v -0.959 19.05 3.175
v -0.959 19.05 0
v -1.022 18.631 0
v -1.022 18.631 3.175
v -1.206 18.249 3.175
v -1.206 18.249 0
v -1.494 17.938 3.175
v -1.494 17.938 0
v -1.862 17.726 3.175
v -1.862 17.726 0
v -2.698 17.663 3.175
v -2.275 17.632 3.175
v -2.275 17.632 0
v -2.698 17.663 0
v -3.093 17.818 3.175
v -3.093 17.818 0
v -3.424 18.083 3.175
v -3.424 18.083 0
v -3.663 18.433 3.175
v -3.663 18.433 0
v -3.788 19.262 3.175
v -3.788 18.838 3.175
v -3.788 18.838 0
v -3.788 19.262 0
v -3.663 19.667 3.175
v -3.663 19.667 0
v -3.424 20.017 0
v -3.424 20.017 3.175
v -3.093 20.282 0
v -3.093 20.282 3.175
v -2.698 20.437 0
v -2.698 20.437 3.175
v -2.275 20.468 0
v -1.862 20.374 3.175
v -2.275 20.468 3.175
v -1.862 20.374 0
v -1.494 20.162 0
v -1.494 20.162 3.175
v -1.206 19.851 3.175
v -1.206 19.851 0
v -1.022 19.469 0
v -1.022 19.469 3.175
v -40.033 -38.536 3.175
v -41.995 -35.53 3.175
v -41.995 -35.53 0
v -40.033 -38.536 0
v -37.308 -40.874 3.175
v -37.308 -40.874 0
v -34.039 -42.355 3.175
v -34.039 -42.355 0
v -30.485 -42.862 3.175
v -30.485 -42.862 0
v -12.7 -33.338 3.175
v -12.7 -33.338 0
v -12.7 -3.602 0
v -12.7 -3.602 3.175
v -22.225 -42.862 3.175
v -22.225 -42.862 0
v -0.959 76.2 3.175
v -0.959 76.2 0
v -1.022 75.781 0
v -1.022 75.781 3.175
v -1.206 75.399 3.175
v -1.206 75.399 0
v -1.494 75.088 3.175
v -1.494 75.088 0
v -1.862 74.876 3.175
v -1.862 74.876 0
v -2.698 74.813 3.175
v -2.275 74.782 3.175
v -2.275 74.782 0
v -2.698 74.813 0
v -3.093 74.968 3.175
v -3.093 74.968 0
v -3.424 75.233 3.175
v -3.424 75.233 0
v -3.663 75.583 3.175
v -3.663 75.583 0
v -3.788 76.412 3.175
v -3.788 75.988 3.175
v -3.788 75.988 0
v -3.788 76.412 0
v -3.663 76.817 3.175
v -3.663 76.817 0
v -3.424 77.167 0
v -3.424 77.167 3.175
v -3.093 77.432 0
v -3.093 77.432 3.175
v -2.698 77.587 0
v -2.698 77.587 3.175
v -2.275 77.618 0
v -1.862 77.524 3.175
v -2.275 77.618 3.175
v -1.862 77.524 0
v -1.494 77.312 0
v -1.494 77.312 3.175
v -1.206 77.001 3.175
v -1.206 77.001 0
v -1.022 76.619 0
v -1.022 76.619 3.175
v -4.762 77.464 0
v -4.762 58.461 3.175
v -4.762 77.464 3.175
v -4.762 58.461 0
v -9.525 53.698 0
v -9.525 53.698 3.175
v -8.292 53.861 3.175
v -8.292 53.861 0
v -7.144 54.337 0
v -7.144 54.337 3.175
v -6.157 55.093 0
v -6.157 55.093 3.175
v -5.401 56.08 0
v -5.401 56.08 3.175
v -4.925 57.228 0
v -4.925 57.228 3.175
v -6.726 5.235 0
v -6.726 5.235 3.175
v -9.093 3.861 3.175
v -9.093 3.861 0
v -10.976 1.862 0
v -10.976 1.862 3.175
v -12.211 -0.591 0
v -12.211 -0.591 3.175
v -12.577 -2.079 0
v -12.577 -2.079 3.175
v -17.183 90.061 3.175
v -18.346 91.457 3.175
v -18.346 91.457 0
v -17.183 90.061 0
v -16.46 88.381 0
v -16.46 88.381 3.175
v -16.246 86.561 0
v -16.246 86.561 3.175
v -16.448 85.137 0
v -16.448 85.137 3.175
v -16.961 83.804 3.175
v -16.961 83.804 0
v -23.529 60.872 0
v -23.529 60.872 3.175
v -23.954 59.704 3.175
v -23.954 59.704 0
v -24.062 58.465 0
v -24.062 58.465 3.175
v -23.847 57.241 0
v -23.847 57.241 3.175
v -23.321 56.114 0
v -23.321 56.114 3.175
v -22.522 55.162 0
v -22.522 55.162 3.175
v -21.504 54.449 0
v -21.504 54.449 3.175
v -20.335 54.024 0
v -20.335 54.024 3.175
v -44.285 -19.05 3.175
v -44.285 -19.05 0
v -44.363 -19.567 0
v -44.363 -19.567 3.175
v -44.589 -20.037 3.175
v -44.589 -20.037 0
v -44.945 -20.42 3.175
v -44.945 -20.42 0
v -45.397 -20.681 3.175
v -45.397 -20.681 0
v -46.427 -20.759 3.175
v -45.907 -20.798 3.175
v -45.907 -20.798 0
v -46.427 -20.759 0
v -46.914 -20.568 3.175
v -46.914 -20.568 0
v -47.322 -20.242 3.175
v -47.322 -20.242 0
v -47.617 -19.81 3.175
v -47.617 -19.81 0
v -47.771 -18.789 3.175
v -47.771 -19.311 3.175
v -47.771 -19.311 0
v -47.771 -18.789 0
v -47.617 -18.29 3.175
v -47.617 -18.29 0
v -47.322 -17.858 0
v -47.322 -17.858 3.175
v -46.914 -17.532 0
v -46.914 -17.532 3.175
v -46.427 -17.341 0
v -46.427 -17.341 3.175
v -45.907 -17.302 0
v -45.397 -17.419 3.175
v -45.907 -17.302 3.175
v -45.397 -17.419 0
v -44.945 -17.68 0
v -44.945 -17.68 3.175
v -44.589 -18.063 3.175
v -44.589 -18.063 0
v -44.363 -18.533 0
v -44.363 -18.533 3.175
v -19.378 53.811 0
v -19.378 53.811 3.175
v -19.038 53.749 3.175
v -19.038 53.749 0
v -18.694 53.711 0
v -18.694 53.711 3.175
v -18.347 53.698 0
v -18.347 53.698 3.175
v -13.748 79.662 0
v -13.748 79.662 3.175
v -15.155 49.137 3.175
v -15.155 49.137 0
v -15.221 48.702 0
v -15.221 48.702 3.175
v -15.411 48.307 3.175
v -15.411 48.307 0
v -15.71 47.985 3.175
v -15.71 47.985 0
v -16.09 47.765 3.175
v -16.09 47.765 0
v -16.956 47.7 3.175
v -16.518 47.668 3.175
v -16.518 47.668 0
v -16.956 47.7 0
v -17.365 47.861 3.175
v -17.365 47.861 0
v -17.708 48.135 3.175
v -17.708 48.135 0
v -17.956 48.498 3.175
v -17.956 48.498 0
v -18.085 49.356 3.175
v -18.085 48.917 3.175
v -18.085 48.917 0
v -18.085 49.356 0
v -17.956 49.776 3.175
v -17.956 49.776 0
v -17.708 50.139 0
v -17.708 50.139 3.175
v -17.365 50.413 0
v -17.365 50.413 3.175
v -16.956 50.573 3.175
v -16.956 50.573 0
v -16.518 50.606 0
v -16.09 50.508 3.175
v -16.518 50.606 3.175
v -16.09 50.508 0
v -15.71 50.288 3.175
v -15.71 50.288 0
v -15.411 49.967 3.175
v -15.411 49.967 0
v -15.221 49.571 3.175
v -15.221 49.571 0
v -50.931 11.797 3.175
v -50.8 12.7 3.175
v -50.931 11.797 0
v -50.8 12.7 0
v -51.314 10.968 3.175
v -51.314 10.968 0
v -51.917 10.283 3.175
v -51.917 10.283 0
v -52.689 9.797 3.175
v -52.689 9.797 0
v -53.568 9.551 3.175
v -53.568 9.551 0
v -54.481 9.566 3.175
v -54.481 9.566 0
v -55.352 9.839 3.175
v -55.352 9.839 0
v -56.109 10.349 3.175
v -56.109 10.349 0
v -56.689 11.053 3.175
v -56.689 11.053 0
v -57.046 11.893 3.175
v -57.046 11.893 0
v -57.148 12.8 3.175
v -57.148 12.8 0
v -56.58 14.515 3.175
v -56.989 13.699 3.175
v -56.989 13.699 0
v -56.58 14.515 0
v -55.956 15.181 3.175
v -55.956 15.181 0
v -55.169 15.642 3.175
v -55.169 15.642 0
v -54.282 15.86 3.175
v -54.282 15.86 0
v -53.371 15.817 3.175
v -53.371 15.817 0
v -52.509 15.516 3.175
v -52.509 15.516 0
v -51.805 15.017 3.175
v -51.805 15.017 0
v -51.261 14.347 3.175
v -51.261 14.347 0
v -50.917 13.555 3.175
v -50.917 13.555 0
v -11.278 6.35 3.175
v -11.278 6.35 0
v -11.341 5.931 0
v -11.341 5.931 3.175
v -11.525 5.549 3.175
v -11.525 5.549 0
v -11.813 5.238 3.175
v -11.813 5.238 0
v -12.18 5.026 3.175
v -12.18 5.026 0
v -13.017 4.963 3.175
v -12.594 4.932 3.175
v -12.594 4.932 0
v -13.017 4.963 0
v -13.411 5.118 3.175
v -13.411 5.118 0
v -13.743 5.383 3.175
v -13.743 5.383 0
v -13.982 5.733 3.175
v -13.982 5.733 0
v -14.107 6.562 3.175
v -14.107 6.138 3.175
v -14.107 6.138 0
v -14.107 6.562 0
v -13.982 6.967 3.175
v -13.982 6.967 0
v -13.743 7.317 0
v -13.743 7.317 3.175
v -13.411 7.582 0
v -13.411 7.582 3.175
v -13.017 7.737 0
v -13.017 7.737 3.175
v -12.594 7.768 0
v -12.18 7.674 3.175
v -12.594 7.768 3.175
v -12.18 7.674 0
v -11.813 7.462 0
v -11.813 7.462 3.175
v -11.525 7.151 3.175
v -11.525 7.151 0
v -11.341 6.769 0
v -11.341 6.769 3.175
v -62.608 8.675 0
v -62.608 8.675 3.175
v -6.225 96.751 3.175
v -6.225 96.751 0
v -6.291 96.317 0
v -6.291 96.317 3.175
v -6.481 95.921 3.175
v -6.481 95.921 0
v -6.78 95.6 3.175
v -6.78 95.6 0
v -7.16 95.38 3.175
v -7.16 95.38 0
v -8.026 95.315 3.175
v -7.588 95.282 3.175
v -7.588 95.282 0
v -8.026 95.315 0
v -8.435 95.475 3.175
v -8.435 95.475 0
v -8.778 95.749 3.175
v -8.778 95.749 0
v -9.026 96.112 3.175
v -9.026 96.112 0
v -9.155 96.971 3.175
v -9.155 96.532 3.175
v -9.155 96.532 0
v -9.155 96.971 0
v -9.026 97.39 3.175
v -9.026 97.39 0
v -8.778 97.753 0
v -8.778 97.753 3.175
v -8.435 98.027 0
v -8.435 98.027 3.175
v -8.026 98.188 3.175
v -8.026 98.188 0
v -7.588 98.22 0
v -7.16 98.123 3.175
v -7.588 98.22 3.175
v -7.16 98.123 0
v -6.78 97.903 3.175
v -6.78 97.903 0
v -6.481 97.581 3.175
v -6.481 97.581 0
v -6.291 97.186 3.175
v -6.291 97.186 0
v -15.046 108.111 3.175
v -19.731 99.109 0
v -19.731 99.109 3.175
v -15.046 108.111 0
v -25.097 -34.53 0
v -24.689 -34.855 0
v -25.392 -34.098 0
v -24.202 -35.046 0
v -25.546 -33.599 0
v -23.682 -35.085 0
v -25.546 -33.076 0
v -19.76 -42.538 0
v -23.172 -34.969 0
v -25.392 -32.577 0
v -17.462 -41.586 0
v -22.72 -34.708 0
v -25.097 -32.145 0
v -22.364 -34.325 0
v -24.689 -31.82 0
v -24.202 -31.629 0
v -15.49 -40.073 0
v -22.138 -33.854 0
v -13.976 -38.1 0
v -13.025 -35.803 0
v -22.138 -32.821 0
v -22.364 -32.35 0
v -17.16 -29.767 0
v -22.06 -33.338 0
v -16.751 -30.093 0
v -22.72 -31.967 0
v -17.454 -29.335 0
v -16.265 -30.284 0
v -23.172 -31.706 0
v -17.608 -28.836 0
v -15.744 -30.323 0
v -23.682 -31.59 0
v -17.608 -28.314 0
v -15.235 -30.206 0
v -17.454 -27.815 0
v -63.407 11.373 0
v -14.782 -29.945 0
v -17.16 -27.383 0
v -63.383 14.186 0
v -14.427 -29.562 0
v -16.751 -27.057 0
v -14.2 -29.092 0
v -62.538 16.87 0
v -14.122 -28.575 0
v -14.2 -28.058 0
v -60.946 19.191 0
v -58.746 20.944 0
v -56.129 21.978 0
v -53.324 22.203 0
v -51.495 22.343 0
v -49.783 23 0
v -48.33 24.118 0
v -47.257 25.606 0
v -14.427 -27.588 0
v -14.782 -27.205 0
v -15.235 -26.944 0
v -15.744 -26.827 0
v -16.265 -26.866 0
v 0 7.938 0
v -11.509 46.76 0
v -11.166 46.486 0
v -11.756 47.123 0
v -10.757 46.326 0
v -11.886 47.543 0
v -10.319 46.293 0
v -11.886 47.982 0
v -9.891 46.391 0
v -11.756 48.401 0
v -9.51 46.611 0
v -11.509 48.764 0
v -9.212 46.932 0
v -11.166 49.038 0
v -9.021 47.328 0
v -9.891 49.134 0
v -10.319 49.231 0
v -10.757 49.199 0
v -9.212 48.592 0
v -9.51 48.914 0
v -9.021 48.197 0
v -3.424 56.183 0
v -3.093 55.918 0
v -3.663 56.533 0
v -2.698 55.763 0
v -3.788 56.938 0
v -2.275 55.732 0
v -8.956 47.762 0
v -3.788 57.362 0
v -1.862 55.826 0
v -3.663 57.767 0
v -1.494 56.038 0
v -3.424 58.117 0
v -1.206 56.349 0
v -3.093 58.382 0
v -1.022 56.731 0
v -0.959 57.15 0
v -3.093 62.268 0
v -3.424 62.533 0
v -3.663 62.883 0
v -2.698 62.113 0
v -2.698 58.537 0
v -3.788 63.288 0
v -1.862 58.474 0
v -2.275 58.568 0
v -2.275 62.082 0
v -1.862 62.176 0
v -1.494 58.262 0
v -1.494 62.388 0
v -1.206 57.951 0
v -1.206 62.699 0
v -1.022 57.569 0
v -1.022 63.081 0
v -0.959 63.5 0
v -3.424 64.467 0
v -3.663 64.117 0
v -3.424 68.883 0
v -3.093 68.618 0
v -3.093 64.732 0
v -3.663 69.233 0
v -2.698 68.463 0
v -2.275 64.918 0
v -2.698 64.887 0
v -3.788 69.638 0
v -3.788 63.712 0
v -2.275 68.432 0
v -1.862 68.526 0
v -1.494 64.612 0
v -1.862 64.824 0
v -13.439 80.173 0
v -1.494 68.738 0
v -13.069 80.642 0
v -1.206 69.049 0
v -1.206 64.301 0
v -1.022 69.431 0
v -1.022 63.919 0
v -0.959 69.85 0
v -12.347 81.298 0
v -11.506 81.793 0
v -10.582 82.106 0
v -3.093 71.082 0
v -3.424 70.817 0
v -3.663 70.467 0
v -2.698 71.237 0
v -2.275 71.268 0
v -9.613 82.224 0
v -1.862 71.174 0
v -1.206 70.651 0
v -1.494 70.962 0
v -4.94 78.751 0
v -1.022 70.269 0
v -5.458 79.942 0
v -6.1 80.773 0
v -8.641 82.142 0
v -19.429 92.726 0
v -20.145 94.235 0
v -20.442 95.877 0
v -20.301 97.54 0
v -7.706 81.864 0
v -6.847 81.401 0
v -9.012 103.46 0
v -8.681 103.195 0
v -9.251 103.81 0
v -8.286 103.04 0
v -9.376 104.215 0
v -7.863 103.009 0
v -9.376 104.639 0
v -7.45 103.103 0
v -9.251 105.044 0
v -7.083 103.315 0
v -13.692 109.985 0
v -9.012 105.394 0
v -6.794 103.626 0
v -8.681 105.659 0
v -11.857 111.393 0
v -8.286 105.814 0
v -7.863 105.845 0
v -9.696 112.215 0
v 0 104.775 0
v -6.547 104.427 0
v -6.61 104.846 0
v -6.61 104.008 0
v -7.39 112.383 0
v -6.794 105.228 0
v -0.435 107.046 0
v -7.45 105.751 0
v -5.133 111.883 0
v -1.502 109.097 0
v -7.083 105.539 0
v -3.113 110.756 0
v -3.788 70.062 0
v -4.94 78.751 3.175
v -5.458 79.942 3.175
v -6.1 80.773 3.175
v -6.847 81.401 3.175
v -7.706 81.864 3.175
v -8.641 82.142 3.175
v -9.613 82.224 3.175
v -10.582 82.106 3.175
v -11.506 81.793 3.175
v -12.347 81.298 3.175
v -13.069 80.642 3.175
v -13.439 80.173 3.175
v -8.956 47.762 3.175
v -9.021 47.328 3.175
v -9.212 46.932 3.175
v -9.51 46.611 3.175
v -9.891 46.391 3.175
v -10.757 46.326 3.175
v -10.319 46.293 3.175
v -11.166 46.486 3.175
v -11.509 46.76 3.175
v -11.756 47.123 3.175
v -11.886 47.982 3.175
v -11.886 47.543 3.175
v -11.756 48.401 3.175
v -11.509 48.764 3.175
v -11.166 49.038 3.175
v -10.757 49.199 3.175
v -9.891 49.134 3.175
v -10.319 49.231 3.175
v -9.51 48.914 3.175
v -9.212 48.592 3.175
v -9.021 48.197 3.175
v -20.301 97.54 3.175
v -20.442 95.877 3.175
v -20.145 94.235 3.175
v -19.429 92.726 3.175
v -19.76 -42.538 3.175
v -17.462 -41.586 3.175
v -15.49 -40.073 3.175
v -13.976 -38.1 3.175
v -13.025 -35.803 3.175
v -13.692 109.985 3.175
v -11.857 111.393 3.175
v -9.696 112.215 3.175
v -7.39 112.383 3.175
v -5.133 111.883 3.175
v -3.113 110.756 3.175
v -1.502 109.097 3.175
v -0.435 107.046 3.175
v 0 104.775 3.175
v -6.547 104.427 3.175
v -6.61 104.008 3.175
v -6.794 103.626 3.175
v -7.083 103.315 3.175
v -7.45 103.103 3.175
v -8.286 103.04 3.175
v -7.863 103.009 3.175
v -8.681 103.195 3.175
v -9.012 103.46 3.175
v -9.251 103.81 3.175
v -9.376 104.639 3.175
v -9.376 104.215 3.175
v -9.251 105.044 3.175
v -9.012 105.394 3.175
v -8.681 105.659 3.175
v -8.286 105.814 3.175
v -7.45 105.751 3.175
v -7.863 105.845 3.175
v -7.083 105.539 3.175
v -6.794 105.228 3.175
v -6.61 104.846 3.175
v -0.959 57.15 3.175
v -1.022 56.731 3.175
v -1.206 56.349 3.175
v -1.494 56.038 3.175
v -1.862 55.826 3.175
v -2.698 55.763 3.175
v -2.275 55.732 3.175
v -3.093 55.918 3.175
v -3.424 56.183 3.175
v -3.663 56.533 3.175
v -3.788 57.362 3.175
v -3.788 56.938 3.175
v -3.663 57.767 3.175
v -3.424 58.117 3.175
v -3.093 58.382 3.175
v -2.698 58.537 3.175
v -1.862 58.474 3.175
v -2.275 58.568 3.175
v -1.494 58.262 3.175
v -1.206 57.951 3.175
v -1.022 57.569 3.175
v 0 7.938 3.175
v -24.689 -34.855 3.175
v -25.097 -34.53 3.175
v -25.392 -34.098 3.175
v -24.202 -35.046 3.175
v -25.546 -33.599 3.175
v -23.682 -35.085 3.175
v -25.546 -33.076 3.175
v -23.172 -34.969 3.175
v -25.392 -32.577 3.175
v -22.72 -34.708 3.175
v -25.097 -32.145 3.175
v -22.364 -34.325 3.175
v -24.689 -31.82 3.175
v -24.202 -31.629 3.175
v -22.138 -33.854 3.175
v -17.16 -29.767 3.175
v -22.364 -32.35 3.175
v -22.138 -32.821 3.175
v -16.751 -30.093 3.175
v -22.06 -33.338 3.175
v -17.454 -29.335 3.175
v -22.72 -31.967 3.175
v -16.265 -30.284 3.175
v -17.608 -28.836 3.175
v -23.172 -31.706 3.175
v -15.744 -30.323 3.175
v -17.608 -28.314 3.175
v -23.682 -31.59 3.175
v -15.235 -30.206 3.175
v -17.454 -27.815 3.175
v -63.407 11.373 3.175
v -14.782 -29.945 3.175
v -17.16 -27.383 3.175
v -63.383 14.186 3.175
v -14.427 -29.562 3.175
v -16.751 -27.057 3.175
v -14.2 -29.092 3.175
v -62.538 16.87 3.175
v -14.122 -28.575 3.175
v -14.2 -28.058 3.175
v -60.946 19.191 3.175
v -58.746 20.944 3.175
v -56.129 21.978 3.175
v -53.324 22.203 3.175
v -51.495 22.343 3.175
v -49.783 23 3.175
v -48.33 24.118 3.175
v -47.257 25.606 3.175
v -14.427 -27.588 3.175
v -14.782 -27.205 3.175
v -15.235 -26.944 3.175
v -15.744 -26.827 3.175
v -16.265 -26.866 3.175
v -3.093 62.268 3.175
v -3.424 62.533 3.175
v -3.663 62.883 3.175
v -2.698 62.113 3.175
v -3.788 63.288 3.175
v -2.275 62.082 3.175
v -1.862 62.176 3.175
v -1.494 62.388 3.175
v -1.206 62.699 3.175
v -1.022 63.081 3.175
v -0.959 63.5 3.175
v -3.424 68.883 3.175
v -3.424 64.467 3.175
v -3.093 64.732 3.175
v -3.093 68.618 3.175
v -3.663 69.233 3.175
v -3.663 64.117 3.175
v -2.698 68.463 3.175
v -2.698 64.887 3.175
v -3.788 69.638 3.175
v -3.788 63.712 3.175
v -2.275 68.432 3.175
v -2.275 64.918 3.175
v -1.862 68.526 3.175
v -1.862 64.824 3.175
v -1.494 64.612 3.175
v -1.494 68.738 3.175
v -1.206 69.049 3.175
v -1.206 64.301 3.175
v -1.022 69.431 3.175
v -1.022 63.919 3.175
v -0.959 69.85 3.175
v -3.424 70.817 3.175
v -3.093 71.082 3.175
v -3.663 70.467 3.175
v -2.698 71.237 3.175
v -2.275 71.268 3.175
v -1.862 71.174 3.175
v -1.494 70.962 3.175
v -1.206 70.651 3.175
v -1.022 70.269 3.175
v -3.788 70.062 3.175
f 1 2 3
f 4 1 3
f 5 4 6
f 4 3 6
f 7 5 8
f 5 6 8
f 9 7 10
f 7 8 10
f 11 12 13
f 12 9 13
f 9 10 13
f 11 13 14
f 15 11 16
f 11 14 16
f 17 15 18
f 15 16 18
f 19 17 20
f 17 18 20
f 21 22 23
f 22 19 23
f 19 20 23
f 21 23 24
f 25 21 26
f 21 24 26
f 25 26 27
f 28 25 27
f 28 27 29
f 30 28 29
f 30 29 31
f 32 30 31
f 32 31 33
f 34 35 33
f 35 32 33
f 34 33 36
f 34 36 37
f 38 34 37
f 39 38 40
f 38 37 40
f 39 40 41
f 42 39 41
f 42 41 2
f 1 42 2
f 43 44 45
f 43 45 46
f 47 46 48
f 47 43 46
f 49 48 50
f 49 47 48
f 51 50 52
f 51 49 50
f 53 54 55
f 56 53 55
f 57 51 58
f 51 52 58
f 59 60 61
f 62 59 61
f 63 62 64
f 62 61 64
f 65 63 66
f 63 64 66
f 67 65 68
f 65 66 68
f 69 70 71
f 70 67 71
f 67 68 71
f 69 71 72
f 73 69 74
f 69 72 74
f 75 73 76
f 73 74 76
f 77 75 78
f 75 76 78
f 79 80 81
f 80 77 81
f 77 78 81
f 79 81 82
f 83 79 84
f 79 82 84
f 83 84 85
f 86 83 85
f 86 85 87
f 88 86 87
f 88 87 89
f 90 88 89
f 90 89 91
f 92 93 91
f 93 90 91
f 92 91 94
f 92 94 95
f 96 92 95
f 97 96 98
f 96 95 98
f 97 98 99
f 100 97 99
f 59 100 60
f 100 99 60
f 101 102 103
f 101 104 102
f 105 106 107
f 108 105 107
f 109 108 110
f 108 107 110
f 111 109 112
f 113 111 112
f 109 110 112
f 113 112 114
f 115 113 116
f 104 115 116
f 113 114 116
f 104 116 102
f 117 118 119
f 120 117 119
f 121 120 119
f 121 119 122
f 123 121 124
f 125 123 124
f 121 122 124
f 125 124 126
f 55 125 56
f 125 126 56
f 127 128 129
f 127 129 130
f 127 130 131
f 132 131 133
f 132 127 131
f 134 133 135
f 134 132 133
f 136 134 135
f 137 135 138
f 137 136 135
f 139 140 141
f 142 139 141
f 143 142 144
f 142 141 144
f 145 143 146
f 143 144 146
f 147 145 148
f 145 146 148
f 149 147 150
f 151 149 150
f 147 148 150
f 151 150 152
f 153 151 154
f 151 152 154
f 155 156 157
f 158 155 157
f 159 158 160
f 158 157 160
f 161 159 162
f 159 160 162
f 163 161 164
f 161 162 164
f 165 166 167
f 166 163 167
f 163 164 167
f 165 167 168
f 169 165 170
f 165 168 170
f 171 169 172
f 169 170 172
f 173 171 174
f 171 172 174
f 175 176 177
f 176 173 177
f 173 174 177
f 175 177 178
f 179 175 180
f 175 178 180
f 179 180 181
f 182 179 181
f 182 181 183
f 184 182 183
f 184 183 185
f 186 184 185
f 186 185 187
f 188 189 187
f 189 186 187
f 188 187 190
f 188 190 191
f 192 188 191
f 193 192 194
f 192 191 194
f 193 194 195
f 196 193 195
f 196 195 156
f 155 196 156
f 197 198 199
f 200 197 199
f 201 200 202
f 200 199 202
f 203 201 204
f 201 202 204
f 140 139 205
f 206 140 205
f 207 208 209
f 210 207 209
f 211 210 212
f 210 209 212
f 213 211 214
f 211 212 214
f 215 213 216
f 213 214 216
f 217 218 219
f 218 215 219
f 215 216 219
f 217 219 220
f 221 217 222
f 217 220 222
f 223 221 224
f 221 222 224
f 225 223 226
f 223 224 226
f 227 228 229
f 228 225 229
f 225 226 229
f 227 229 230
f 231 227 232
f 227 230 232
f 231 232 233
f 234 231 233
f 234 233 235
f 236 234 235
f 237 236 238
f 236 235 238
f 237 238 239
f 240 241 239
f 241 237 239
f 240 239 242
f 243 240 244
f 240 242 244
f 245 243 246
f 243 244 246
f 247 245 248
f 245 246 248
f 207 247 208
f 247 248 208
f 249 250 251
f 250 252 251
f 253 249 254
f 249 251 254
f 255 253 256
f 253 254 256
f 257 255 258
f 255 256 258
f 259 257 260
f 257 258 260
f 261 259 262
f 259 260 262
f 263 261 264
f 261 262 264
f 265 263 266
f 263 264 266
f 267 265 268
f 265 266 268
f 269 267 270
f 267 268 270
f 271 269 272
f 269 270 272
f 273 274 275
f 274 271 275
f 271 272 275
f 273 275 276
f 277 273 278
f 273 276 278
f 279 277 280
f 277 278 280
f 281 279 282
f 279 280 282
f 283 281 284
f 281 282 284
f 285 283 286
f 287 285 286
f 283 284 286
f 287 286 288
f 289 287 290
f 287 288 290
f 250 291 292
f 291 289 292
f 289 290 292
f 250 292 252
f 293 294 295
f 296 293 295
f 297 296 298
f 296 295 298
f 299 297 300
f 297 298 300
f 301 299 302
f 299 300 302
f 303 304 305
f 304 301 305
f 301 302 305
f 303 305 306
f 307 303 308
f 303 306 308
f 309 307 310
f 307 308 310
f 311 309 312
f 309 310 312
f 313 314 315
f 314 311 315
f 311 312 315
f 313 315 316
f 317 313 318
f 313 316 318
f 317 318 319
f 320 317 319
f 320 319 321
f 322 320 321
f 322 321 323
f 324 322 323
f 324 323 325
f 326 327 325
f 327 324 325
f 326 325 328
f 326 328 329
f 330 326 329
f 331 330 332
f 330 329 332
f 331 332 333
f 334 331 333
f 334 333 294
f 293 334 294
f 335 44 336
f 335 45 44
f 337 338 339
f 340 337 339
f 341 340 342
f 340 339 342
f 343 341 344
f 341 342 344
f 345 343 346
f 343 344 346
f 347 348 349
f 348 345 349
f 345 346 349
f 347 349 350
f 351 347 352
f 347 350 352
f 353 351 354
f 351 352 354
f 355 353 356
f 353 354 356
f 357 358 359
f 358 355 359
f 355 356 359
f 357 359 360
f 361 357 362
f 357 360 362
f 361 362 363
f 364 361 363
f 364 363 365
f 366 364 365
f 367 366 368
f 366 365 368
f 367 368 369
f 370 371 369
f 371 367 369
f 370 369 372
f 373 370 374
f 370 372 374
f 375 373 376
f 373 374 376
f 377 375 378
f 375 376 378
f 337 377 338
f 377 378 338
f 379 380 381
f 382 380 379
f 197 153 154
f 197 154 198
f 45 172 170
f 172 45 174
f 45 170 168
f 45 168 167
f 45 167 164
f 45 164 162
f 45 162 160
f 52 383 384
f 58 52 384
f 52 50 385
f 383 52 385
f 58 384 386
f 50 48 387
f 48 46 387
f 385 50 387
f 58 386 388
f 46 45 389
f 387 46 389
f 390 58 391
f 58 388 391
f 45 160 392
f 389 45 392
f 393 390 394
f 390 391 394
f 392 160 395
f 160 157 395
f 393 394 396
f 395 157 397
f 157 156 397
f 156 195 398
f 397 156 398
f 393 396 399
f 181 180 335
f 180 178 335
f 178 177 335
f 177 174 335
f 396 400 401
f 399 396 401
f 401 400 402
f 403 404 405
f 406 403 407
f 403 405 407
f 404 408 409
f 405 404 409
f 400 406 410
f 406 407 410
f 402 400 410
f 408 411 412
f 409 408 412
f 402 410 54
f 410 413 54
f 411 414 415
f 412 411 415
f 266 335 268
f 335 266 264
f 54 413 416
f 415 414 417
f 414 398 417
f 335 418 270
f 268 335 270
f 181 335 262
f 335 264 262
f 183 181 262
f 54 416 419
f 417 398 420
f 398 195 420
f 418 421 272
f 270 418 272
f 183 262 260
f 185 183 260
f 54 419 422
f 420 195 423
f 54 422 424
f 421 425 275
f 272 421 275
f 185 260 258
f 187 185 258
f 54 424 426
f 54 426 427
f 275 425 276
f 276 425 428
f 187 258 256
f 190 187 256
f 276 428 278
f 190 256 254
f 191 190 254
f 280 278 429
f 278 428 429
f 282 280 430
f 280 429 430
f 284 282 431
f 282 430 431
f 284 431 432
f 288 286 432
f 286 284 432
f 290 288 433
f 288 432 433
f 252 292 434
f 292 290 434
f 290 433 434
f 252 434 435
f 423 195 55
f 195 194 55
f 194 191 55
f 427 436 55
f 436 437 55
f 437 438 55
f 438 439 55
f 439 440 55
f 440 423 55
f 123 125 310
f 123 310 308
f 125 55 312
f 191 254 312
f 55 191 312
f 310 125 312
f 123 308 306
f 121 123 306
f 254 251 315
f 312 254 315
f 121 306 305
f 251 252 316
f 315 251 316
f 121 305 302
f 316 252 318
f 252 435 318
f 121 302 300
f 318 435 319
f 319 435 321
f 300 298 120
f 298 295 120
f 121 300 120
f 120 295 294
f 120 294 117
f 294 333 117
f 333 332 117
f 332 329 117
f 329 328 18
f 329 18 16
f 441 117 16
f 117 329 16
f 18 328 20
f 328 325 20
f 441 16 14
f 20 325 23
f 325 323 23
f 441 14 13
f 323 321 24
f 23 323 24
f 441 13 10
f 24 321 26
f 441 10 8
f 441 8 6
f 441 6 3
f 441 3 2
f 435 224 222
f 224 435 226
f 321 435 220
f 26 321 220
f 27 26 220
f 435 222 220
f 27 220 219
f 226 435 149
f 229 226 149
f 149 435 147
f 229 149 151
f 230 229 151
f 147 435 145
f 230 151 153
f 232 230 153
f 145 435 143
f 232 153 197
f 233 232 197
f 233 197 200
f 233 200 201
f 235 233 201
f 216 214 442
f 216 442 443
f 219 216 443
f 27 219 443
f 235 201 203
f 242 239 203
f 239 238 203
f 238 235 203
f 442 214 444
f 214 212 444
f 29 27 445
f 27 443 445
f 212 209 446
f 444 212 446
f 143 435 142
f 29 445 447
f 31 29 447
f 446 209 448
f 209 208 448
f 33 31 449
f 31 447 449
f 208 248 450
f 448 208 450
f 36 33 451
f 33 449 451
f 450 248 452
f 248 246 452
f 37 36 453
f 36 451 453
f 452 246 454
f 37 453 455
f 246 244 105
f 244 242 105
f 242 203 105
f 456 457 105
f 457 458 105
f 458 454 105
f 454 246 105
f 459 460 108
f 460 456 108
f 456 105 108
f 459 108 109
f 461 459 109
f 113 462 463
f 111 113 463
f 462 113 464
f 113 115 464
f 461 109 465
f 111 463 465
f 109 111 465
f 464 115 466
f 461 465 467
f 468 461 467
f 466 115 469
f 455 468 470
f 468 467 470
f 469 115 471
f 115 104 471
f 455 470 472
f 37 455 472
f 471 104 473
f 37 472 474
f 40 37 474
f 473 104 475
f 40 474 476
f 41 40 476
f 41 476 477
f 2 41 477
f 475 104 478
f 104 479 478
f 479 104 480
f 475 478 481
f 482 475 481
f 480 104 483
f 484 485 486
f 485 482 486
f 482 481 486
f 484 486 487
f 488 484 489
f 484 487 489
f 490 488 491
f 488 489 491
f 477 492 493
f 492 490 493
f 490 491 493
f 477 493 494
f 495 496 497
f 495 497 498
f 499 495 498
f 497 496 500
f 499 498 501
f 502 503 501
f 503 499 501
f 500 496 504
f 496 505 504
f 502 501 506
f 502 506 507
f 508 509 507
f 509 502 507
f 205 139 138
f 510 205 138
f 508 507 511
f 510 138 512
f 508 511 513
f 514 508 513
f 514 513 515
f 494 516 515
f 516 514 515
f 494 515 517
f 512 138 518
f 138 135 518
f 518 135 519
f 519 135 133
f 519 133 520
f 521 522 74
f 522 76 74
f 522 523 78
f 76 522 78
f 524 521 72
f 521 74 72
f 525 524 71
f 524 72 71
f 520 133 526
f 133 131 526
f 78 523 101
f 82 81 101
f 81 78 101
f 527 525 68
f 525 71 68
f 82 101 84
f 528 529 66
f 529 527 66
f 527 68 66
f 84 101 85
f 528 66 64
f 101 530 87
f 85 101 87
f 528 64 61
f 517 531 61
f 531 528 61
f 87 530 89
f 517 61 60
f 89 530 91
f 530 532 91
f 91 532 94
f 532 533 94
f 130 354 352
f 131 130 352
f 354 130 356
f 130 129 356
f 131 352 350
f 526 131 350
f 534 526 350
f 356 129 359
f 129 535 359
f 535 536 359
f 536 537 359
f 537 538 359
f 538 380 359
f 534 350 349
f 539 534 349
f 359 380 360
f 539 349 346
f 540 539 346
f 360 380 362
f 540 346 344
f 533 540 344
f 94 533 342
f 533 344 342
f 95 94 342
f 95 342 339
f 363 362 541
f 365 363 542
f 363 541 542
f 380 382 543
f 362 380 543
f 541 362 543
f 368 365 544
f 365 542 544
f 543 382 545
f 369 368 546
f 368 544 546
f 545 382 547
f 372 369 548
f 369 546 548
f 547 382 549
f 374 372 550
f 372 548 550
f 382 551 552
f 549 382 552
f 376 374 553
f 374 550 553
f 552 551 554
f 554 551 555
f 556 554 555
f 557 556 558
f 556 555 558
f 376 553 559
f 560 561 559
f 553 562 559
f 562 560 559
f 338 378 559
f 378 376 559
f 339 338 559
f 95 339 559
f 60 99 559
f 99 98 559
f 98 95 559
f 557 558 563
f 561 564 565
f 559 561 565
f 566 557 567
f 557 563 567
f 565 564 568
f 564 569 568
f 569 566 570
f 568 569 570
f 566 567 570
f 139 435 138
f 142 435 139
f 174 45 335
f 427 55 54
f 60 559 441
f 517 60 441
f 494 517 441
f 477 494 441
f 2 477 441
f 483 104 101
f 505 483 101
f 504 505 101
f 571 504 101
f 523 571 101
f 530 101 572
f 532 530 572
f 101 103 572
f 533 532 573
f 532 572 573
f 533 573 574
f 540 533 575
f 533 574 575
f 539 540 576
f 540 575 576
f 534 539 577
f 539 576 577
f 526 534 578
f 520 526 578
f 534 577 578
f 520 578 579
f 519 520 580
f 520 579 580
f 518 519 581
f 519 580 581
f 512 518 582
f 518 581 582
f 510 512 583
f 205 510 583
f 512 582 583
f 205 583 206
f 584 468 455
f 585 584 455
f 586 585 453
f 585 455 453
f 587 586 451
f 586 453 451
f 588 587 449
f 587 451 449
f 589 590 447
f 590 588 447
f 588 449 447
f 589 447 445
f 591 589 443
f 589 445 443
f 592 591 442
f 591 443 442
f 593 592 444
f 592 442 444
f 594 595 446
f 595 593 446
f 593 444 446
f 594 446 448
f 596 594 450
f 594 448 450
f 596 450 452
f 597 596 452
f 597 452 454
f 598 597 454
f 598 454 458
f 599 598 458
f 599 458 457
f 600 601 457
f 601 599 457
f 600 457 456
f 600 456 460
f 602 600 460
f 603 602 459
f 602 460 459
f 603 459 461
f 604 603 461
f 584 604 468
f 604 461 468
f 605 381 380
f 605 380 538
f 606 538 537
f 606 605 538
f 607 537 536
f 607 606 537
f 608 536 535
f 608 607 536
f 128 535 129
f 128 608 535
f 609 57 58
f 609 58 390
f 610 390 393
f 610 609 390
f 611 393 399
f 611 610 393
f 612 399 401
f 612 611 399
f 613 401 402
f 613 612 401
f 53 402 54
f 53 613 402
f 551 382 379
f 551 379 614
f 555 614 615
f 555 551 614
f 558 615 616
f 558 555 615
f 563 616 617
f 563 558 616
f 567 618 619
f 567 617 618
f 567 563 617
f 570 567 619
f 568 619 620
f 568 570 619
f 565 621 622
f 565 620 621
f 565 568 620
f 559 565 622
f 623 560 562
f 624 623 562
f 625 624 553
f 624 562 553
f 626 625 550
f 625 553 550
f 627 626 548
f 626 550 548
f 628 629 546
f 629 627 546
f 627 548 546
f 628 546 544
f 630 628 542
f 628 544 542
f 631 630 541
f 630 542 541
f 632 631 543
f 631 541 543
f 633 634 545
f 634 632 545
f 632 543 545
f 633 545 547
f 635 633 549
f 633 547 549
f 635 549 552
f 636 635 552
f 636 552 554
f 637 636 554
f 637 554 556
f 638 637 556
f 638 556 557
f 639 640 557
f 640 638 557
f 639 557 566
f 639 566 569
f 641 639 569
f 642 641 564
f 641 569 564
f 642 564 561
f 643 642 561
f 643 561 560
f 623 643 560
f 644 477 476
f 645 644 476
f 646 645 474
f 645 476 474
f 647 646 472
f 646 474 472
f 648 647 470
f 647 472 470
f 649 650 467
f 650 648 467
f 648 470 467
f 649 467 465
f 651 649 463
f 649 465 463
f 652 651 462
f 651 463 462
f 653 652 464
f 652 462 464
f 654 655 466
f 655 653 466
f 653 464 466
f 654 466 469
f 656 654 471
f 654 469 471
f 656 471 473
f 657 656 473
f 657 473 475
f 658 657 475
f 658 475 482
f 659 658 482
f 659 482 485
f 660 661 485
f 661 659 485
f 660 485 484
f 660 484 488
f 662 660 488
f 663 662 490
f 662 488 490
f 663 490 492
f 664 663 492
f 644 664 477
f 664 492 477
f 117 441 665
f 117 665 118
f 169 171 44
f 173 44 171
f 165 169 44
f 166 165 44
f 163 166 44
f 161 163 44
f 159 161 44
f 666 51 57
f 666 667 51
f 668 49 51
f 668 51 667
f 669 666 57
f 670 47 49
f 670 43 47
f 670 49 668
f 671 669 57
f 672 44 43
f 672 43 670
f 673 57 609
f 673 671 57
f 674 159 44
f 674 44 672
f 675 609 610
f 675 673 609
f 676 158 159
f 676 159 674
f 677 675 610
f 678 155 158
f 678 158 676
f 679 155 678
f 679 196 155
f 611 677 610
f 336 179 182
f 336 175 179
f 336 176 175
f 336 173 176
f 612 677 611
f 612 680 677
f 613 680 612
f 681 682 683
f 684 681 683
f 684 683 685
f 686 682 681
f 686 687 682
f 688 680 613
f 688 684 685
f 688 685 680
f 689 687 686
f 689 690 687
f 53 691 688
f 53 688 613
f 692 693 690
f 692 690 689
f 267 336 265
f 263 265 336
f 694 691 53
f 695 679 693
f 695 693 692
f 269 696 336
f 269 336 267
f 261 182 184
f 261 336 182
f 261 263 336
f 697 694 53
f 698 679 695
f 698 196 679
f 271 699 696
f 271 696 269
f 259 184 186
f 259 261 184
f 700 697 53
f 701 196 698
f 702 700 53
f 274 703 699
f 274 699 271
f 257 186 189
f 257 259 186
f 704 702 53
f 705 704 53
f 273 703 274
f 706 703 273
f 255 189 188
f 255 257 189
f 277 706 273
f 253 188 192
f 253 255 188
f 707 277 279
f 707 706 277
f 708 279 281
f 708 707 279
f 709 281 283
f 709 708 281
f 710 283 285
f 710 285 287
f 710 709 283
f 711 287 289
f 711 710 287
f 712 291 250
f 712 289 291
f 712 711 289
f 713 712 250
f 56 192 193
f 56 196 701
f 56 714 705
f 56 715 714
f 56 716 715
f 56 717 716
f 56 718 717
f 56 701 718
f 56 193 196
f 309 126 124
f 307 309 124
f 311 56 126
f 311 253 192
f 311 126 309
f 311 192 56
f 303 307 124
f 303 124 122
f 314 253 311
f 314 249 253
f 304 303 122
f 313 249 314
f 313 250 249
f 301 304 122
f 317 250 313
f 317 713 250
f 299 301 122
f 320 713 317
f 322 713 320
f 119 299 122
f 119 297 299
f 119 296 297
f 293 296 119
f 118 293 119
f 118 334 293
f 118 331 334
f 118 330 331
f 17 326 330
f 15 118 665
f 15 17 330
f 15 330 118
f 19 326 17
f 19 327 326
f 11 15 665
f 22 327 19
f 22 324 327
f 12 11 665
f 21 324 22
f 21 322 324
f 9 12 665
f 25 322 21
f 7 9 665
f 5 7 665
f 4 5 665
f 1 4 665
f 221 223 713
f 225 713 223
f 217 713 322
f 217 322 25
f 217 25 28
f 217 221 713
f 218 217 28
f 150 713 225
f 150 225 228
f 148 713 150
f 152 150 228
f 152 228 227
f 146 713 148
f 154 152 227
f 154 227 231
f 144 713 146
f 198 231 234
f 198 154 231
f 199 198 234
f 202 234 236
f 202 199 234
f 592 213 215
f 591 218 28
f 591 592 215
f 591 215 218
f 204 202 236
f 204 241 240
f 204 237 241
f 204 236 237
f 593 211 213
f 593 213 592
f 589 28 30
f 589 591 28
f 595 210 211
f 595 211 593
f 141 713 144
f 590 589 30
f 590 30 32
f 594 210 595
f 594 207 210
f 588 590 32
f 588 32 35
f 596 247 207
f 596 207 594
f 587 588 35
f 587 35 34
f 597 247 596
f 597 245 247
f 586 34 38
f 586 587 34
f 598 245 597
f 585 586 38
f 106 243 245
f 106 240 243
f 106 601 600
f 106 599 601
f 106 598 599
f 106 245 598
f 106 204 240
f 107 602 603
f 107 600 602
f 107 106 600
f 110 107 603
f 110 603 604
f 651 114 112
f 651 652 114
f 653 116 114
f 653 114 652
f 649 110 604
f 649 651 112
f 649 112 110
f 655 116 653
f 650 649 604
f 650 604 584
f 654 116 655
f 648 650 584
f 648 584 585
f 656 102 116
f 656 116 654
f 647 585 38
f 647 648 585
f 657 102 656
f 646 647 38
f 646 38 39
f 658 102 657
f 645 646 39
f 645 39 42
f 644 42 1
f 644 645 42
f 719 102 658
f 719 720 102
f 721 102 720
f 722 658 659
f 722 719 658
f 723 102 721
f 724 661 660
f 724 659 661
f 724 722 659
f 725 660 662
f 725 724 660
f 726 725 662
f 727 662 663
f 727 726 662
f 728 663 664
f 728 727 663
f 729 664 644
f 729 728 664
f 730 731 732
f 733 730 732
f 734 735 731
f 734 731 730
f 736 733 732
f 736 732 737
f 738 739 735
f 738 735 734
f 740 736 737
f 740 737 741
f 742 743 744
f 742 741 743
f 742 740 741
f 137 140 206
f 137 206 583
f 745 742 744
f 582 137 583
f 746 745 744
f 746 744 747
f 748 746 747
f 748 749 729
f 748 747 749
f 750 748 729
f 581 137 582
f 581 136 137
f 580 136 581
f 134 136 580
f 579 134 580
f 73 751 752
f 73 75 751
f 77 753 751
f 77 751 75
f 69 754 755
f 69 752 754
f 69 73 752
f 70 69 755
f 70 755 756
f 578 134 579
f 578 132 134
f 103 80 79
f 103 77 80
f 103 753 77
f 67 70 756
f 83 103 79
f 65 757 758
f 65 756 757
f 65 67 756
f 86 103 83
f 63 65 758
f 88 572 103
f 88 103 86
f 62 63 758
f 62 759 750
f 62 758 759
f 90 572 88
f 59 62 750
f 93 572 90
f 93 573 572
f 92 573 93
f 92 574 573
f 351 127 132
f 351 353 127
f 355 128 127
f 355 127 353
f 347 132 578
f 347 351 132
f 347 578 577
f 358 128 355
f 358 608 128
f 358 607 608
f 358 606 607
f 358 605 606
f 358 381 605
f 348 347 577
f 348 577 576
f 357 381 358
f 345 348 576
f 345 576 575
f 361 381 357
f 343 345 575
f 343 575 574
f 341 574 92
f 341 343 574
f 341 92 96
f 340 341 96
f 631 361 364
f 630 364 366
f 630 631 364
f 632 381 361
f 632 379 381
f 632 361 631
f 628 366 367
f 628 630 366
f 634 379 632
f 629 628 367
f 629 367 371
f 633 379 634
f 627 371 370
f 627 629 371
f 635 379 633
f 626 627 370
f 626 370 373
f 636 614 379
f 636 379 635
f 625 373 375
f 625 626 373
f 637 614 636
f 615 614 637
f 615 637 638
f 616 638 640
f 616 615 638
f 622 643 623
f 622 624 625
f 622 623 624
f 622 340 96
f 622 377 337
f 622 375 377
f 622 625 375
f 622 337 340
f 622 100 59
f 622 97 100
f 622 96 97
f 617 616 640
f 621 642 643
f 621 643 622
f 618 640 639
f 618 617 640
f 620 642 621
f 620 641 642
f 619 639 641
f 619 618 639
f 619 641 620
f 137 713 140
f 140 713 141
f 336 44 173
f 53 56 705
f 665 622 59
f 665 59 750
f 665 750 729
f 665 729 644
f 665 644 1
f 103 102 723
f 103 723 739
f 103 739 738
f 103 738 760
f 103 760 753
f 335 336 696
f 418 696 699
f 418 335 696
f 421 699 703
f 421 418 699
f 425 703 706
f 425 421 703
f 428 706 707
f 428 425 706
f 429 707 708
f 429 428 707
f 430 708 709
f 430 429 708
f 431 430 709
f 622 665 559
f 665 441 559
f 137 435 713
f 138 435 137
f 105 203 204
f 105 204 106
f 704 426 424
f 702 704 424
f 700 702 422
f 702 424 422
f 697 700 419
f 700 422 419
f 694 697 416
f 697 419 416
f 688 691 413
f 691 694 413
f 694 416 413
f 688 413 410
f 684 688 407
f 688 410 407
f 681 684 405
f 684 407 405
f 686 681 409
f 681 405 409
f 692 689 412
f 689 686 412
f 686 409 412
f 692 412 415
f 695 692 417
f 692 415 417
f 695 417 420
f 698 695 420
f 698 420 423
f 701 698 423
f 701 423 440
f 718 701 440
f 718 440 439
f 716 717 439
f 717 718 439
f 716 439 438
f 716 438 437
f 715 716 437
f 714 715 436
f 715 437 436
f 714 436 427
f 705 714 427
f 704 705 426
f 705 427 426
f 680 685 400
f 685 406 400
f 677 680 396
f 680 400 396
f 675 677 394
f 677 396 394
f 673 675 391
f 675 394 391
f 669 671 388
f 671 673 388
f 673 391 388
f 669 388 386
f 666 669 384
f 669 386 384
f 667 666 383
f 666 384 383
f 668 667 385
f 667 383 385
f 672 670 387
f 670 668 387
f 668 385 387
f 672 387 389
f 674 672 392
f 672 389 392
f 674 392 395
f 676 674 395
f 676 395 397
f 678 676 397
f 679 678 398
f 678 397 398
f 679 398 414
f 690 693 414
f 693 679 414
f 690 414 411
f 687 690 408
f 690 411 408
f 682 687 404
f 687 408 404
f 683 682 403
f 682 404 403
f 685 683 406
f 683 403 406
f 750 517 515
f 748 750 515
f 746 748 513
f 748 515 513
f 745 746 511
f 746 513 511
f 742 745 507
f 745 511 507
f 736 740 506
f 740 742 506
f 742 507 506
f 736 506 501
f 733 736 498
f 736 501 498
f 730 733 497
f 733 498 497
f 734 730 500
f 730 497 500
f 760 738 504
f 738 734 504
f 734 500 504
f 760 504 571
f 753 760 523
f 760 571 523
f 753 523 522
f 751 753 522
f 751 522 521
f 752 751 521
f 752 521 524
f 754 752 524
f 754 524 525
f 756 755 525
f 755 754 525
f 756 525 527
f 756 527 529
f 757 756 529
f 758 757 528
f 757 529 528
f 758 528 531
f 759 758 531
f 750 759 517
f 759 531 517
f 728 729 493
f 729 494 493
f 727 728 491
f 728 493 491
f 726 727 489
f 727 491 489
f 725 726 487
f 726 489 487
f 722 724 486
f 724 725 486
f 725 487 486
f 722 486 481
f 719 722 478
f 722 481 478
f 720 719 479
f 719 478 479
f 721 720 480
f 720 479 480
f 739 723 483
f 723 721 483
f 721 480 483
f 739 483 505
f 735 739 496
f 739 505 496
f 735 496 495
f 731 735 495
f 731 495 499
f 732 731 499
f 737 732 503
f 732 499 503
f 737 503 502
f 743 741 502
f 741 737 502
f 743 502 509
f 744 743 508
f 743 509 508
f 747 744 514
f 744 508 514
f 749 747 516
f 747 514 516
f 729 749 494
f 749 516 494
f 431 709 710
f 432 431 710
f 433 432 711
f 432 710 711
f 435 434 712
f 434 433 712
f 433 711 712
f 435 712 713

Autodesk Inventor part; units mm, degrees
ref_plane "YZ Plane" through (0, 0, 0) normal (1, 0, 0) x (0, 1, 0)
ref_plane "XZ Plane" through (0, 0, 0) normal (0, 1, 0) x (-1, 0, 0)
ref_plane "XY Plane" through (0, 0, 0) normal (0, 0, 1) x (1, 0, 0)
sketch "Sketch1" plane through (0, 0, 0) normal (0, 0, 1) x (1, 0, 0)
  line L0 (0, 0) -> (0, 137.0131)
  line L1 (-11.7886, 12.2907) -> (-39.6863, 18.4755) construction
  line L2 (-39.6863, 18.4755) -> (-33.3297, 47.1481) construction
  line L3 (-33.3297, 47.1481) -> (-5.432, 40.9633) construction
  line L4 (-5.432, 40.9633) -> (-11.7886, 12.2907) construction
  line L5 (-39.6863, 18.4755) -> (-5.432, 40.9633) construction
  line L6 (-33.3297, 47.1481) -> (-11.7886, 12.2907) construction
  circle A0 centre (-53.975, 12.7) radius 3.175
  circle A1 centre (-53.975, 12.7) radius 9.525
  line L7 (0, 0) -> (-54.5315, 3.1913) construction
  line L8 (-62.4238, 17.0982) -> (0, 137.0131)
  line L9 (-27.1302, 45.7737) -> (-37.4529, 28.5497) construction
  line L10 (-11.6315, 42.3377) -> (-9.5552, 22.3649) construction
  line L11 (-19.3809, 44.0557) -> (-25.7374, 15.3831) construction
  line L12 (0, 104.775) -> (-15.0457, 108.1106)
  line L13 (-35.3766, 8.5768) -> (-19.8779, 5.1408) construction
  line L14 (-19.8779, 5.1408) -> (-21.2523, -1.0586) construction
  line L15 (-21.2523, -1.0586) -> (-36.751, 2.3773) construction
  line L16 (-36.751, 2.3773) -> (-35.3766, 8.5768) construction
  line L17 (-35.3766, 8.5768) -> (-44.7305, 2.6177) construction
  line L18 (-19.8779, 5.1408) -> (-17.2457, 1.0092) construction
  line L19 (-5.432, 40.9633) -> (-33.3297, 47.1481) construction
  line L20 (-33.3297, 47.1481) -> (-32.2475, 52.0296) construction
  line L21 (-32.2475, 52.0296) -> (-4.3498, 45.8448) construction
  line L22 (-4.3498, 45.8448) -> (-5.432, 40.9633) construction
  line L23 (-53.2878, 15.7997) -> (-53.975, 12.7) construction
  line L24 (-53.975, 12.7) -> (-57.0747, 13.3872) construction
  line L25 (-27.6272, 6.8588) -> (-34.4992, -24.1386) construction
  line L26 (-31.8676, 50.076) -> (-5.5198, 44.2349) construction
  line L27 (-5.5198, 44.2349) -> (-4.489, 48.8845) construction
  line L28 (-4.489, 48.8845) -> (-30.8368, 54.7256) construction
  line L29 (-30.8368, 54.7256) -> (-31.8676, 50.076) construction
  line L30 (-31.3522, 52.4008) -> (-5.0044, 46.5597) construction
  circle A2 centre (-29.0274, 51.8854) radius 1.4732 construction
  circle A3 centre (-22.8279, 50.5111) radius 1.4732 construction
  circle A4 centre (-16.6284, 49.1367) radius 1.4732
  circle A5 centre (-10.4289, 47.7623) radius 1.4732
  circle A6 centre (-7.6985, 96.7513) radius 1.4732
  line L31 (-53.975, 12.7) -> (-5.4185, 105.9762)
  line L32 (-31.2085, 56.4341) -> (0, 49.5153)
  circle A7 centre (-7.6985, 96.7513) radius 4.7625
  line L33 (-4.7625, 50.5712) -> (-4.7625, 105.8308)
  line L34 (-26.3948, 55.3669) -> (-7.323, 92.0036)
  line L35 (-3.5958, 94.3328) -> (-4.7625, 94.5914) construction
  line L36 (-17.2457, 1.0092) -> (0, 1.0092) construction
  line L37 (0, 1.0092) -> (0, -2.1658) construction
  line L38 (0, -2.1658) -> (-17.2457, -2.1658) construction
  line L39 (-17.2457, -2.1658) -> (-17.2457, 1.0092) construction
  circle A8 centre (-12.7, 7.9375) radius 1.5875 construction
  line L40 (-12.7, 7.9375) -> (0, 7.9375) construction
  line L41 (0, 7.9375) -> (-17.2457, 1.0092)
  circle A9 centre (-12.7, 7.9375) radius 3.175 construction
  line L42 (-9.525, 7.9375) -> (-9.525, 4.111) construction
  line L43 (-9.525, 7.9375) -> (0, 7.9375) construction
  line L44 (-17.9187, 46.9837) -> (-16.8879, 51.6333) construction
  line L45 (-12.4942, 45.7811) -> (-26.2381, -16.2137) construction
  line L46 (0, 53.6985) -> (0, 7.9375) construction
  line L47 (-26.2381, -16.2137) -> (-20.0386, -17.5881) construction
  line L48 (-20.0386, -17.5881) -> (-8.7313, 7.9375)
  circle A10 centre (-12.7, 6.35) radius 1.4224
  line L49 (0, 13.4938) -> (-4.7625, 13.4938) construction
  line L50 (-4.7625, 13.4938) -> (-4.7625, 24.6063) construction
  line L51 (-4.7625, 24.6063) -> (0, 24.6063) construction
  line L52 (0, 24.6063) -> (0, 13.4938) construction
  line L53 (-4.7625, 19.05) -> (0, 19.05) construction
  circle A11 centre (-2.3813, 19.05) radius 1.4224
  line L54 (-20.7405, 8.5842) -> (-9.7454, 58.18) construction
  line L55 (-9.7454, 58.18) -> (-3.5459, 56.8056) construction
  line L56 (-3.5459, 56.8056) -> (-14.5411, 7.2098) construction
  line L57 (-14.5411, 7.2098) -> (-20.7405, 8.5842) construction
  line L58 (-12.7, 6.35) -> (-12.7, 7.9375) construction
  line L59 (-11.5442, 1.5875) -> (-9.525, 1.5875) construction
  line L60 (-9.525, 1.5875) -> (-9.525, 7.9375) construction
  line L61 (-9.525, 7.9375) -> (-11.5442, 7.9375) construction
  line L62 (-11.5442, 7.9375) -> (-11.5442, 1.5875) construction
  line L63 (-9.7454, 58.18) -> (-15.9449, 59.5544) construction
  line L64 (-18.8691, 53.6985) -> (0, 53.6985)
  line L65 (-9.7454, 58.18) -> (-17.3193, 53.3549) construction
  arc A12 (-10.2313, 55.9882) -> (-11.9373, 58.6659) centre (-11.0843, 57.3271) ccw construction
  line L66 (-4.7625, 57.15) -> (0, 57.15) construction
  circle A13 centre (-2.3813, 57.15) radius 1.4224
  circle A14 centre (-2.3813, 63.5) radius 1.4224
  line L67 (0, 7.9375) -> (-38.5755, 7.9375) construction
  line L68 (-38.5755, 7.9375) -> (-38.5755, -42.8625) construction
  line L69 (-38.5755, -42.8625) -> (0, -42.8625)
  line L70 (0, -42.8625) -> (0, 7.9375)
  line L71 (-38.5755, -42.8625) -> (-62.6076, 8.6746)
  line L72 (-60.0032, 20.0747) -> (-18.8691, 53.6985)
  line L73 (-20.0386, -17.5881) -> (-20.0386, -42.8625) construction
  line L74 (-20.2435, 47.4991) -> (-19.2127, 52.1487) construction
  line L75 (-12.7, -42.8625) -> (-12.7, -1.0217)
  circle A15 centre (-23.8125, -33.3375) radius 1.7526
  circle A16 centre (-15.875, -28.575) radius 1.7526
  circle A17 centre (-23.8125, -33.3375) radius 3.175 construction
  circle A18 centre (-2.3813, 69.85) radius 1.4224
  circle A19 centre (-2.3813, 76.2) radius 1.4224
  circle A20 centre (-15.875, -28.575) radius 3.175 construction
  circle A21 centre (-46.0375, -19.05) radius 1.7526
  arc A22 (0, 104.775) -> (-15.0457, 108.1106) centre (-7.9697, 104.427) ccw
  circle A23 centre (-7.9697, 104.427) radius 1.4224
  line L76 (-7.9697, 104.427) -> (-15.0457, 108.1106) construction
  line L77 (-7.9697, 104.427) -> (0, 104.775) construction
  line L78 (-14.2148, 89.0787) -> (-22.6636, 93.4768)
  point P0 (-22.5591, 29.7194)
  point P1 (-20.7484, 1.2142)
  point P2 (-36.3367, 4.2458)
  point P3 (-49.5768, 21.1488)
  point P4 (-11.1125, 7.9375)
  point P5 (-11.4283, 6.9872)
  point P6 (-11.9574, 7.9375)
  point P7 (-13.9717, 6.9872)
  point P8 (-9.525, 6.1457)
  point P9 (-10.6215, 3.6705)
  point P10 (-4.7625, 93.0015)
  point P11 (-4.7625, 53.6985)
  dimension "d74" = 6.35
  dimension "d14" = 29.3687
  dimension "d15" = 28.575
  dimension "d16" = 12.5
  dimension "d17" = 6.35
  dimension "d19" = 53.975
  dimension "d22" = 19.05
  dimension "d23" = 7.9375
  dimension "d24" = 19.05
  dimension "d26" = 102.5
  dimension "d29" = 6.35
  dimension "d31" = 7.9375
  dimension "d34" = 5
  dimension "d35" = 26.9875
  dimension "d38" = 31.75
  dimension "d40" = 26.9875
  dimension "d41" = 4.7625
  dimension "d42" = 2.9464
  dimension "d43" = 2.3813
  dimension "d46" = 6.35
  dimension "d51" = 2.9464
  dimension "d52" = 92.075
  dimension "d53" = 6.35
  dimension "d54" = 9.525
  dimension "d55" = 4.7625
  dimension "d56" = 4.7625
  dimension "d60" = 12.7
  dimension "d61" = 3.175
  dimension "d63" = 3.175
  dimension "d66" = 3.175
  dimension "d67" = 12.7
  dimension "d72" = 8.7312
  dimension "d73" = 7.9375
  dimension "d80" = 12.7
  dimension "d82" = 7.9375
  dimension "d83" = 63.5
  dimension "d85" = 6.35
  dimension "d86" = 104.775
  dimension "d87" = 2.8448
  dimension "d88" = 4.7625
  dimension "d89" = 11.1125
  dimension "d90" = 2.8448
  dimension "d91" = 19.05
  dimension "d92" = 6.35
  dimension "d93" = 50.8
  dimension "d94" = 25.4
  dimension "d95" = 8.7312
  dimension "d96" = 9.525
  dimension "d97" = 6.35
  dimension "d99" = 6.35
  dimension "d101" = 3.175
  dimension "d106" = 2.8448
  dimension "d107" = 57.15
  dimension "d110" = 6.35
  dimension "d136" = 3.175
  dimension "d138" = 42.8625
  dimension "d139" = 12.7
  dimension "d140" = 3.5052
  dimension "d141" = 3.5052
  dimension "d142" = 9.525
  dimension "d143" = 3.175
  dimension "d144" = 11.1125
  dimension "d145" = 6.35
  dimension "d146" = 14.2875
  dimension "d149" = 6.35
extrude "Extrusion1" add sketch "Sketch1" along normal blind 3.175 contours L41 L48 L75 L69 L71 A1 L31 L72 L32 L0 | L32 L33 L64 L0 | L64 L33 A7 L12 L0 | L32 L64 L33 | L12 A22 | L72 L31 L32 | A1 | L33 A7 L31 L12 | L12 L31 A7 L78 L8 | L33 A7 | A7 L31 L33 | L32 L31 A7 L34 | L31 A7
fillet "Fillet6" radius 12.7 1 edges at (-38.5755, -42.8625, 1.5875)
fillet "Fillet7" radius 6.35 3 edges at (-22.6636, 93.4768, 1.5875) (-14.2148, 89.0787, 1.5875) (-49.5768, 21.1488, 1.5875)
fillet "Fillet8" radius 4.7625 5 edges at (-4.7625, 93.0015, 1.5875) (-7.323, 92.0036, 1.5875) (-26.3948, 55.3669, 1.5875) (-18.8691, 53.6985, 1.5875) (-4.7625, 53.6985, 1.5875)
fillet "Fillet9" radius 9.525 3 edges at (-10.6215, 3.6705, 1.5875) (-12.7, -1.0217, 1.5875) (-12.7, -42.8625, 1.5875)
equation "\"d56\" = d55"
properties part number "Uprights" material "UHMW, White"
